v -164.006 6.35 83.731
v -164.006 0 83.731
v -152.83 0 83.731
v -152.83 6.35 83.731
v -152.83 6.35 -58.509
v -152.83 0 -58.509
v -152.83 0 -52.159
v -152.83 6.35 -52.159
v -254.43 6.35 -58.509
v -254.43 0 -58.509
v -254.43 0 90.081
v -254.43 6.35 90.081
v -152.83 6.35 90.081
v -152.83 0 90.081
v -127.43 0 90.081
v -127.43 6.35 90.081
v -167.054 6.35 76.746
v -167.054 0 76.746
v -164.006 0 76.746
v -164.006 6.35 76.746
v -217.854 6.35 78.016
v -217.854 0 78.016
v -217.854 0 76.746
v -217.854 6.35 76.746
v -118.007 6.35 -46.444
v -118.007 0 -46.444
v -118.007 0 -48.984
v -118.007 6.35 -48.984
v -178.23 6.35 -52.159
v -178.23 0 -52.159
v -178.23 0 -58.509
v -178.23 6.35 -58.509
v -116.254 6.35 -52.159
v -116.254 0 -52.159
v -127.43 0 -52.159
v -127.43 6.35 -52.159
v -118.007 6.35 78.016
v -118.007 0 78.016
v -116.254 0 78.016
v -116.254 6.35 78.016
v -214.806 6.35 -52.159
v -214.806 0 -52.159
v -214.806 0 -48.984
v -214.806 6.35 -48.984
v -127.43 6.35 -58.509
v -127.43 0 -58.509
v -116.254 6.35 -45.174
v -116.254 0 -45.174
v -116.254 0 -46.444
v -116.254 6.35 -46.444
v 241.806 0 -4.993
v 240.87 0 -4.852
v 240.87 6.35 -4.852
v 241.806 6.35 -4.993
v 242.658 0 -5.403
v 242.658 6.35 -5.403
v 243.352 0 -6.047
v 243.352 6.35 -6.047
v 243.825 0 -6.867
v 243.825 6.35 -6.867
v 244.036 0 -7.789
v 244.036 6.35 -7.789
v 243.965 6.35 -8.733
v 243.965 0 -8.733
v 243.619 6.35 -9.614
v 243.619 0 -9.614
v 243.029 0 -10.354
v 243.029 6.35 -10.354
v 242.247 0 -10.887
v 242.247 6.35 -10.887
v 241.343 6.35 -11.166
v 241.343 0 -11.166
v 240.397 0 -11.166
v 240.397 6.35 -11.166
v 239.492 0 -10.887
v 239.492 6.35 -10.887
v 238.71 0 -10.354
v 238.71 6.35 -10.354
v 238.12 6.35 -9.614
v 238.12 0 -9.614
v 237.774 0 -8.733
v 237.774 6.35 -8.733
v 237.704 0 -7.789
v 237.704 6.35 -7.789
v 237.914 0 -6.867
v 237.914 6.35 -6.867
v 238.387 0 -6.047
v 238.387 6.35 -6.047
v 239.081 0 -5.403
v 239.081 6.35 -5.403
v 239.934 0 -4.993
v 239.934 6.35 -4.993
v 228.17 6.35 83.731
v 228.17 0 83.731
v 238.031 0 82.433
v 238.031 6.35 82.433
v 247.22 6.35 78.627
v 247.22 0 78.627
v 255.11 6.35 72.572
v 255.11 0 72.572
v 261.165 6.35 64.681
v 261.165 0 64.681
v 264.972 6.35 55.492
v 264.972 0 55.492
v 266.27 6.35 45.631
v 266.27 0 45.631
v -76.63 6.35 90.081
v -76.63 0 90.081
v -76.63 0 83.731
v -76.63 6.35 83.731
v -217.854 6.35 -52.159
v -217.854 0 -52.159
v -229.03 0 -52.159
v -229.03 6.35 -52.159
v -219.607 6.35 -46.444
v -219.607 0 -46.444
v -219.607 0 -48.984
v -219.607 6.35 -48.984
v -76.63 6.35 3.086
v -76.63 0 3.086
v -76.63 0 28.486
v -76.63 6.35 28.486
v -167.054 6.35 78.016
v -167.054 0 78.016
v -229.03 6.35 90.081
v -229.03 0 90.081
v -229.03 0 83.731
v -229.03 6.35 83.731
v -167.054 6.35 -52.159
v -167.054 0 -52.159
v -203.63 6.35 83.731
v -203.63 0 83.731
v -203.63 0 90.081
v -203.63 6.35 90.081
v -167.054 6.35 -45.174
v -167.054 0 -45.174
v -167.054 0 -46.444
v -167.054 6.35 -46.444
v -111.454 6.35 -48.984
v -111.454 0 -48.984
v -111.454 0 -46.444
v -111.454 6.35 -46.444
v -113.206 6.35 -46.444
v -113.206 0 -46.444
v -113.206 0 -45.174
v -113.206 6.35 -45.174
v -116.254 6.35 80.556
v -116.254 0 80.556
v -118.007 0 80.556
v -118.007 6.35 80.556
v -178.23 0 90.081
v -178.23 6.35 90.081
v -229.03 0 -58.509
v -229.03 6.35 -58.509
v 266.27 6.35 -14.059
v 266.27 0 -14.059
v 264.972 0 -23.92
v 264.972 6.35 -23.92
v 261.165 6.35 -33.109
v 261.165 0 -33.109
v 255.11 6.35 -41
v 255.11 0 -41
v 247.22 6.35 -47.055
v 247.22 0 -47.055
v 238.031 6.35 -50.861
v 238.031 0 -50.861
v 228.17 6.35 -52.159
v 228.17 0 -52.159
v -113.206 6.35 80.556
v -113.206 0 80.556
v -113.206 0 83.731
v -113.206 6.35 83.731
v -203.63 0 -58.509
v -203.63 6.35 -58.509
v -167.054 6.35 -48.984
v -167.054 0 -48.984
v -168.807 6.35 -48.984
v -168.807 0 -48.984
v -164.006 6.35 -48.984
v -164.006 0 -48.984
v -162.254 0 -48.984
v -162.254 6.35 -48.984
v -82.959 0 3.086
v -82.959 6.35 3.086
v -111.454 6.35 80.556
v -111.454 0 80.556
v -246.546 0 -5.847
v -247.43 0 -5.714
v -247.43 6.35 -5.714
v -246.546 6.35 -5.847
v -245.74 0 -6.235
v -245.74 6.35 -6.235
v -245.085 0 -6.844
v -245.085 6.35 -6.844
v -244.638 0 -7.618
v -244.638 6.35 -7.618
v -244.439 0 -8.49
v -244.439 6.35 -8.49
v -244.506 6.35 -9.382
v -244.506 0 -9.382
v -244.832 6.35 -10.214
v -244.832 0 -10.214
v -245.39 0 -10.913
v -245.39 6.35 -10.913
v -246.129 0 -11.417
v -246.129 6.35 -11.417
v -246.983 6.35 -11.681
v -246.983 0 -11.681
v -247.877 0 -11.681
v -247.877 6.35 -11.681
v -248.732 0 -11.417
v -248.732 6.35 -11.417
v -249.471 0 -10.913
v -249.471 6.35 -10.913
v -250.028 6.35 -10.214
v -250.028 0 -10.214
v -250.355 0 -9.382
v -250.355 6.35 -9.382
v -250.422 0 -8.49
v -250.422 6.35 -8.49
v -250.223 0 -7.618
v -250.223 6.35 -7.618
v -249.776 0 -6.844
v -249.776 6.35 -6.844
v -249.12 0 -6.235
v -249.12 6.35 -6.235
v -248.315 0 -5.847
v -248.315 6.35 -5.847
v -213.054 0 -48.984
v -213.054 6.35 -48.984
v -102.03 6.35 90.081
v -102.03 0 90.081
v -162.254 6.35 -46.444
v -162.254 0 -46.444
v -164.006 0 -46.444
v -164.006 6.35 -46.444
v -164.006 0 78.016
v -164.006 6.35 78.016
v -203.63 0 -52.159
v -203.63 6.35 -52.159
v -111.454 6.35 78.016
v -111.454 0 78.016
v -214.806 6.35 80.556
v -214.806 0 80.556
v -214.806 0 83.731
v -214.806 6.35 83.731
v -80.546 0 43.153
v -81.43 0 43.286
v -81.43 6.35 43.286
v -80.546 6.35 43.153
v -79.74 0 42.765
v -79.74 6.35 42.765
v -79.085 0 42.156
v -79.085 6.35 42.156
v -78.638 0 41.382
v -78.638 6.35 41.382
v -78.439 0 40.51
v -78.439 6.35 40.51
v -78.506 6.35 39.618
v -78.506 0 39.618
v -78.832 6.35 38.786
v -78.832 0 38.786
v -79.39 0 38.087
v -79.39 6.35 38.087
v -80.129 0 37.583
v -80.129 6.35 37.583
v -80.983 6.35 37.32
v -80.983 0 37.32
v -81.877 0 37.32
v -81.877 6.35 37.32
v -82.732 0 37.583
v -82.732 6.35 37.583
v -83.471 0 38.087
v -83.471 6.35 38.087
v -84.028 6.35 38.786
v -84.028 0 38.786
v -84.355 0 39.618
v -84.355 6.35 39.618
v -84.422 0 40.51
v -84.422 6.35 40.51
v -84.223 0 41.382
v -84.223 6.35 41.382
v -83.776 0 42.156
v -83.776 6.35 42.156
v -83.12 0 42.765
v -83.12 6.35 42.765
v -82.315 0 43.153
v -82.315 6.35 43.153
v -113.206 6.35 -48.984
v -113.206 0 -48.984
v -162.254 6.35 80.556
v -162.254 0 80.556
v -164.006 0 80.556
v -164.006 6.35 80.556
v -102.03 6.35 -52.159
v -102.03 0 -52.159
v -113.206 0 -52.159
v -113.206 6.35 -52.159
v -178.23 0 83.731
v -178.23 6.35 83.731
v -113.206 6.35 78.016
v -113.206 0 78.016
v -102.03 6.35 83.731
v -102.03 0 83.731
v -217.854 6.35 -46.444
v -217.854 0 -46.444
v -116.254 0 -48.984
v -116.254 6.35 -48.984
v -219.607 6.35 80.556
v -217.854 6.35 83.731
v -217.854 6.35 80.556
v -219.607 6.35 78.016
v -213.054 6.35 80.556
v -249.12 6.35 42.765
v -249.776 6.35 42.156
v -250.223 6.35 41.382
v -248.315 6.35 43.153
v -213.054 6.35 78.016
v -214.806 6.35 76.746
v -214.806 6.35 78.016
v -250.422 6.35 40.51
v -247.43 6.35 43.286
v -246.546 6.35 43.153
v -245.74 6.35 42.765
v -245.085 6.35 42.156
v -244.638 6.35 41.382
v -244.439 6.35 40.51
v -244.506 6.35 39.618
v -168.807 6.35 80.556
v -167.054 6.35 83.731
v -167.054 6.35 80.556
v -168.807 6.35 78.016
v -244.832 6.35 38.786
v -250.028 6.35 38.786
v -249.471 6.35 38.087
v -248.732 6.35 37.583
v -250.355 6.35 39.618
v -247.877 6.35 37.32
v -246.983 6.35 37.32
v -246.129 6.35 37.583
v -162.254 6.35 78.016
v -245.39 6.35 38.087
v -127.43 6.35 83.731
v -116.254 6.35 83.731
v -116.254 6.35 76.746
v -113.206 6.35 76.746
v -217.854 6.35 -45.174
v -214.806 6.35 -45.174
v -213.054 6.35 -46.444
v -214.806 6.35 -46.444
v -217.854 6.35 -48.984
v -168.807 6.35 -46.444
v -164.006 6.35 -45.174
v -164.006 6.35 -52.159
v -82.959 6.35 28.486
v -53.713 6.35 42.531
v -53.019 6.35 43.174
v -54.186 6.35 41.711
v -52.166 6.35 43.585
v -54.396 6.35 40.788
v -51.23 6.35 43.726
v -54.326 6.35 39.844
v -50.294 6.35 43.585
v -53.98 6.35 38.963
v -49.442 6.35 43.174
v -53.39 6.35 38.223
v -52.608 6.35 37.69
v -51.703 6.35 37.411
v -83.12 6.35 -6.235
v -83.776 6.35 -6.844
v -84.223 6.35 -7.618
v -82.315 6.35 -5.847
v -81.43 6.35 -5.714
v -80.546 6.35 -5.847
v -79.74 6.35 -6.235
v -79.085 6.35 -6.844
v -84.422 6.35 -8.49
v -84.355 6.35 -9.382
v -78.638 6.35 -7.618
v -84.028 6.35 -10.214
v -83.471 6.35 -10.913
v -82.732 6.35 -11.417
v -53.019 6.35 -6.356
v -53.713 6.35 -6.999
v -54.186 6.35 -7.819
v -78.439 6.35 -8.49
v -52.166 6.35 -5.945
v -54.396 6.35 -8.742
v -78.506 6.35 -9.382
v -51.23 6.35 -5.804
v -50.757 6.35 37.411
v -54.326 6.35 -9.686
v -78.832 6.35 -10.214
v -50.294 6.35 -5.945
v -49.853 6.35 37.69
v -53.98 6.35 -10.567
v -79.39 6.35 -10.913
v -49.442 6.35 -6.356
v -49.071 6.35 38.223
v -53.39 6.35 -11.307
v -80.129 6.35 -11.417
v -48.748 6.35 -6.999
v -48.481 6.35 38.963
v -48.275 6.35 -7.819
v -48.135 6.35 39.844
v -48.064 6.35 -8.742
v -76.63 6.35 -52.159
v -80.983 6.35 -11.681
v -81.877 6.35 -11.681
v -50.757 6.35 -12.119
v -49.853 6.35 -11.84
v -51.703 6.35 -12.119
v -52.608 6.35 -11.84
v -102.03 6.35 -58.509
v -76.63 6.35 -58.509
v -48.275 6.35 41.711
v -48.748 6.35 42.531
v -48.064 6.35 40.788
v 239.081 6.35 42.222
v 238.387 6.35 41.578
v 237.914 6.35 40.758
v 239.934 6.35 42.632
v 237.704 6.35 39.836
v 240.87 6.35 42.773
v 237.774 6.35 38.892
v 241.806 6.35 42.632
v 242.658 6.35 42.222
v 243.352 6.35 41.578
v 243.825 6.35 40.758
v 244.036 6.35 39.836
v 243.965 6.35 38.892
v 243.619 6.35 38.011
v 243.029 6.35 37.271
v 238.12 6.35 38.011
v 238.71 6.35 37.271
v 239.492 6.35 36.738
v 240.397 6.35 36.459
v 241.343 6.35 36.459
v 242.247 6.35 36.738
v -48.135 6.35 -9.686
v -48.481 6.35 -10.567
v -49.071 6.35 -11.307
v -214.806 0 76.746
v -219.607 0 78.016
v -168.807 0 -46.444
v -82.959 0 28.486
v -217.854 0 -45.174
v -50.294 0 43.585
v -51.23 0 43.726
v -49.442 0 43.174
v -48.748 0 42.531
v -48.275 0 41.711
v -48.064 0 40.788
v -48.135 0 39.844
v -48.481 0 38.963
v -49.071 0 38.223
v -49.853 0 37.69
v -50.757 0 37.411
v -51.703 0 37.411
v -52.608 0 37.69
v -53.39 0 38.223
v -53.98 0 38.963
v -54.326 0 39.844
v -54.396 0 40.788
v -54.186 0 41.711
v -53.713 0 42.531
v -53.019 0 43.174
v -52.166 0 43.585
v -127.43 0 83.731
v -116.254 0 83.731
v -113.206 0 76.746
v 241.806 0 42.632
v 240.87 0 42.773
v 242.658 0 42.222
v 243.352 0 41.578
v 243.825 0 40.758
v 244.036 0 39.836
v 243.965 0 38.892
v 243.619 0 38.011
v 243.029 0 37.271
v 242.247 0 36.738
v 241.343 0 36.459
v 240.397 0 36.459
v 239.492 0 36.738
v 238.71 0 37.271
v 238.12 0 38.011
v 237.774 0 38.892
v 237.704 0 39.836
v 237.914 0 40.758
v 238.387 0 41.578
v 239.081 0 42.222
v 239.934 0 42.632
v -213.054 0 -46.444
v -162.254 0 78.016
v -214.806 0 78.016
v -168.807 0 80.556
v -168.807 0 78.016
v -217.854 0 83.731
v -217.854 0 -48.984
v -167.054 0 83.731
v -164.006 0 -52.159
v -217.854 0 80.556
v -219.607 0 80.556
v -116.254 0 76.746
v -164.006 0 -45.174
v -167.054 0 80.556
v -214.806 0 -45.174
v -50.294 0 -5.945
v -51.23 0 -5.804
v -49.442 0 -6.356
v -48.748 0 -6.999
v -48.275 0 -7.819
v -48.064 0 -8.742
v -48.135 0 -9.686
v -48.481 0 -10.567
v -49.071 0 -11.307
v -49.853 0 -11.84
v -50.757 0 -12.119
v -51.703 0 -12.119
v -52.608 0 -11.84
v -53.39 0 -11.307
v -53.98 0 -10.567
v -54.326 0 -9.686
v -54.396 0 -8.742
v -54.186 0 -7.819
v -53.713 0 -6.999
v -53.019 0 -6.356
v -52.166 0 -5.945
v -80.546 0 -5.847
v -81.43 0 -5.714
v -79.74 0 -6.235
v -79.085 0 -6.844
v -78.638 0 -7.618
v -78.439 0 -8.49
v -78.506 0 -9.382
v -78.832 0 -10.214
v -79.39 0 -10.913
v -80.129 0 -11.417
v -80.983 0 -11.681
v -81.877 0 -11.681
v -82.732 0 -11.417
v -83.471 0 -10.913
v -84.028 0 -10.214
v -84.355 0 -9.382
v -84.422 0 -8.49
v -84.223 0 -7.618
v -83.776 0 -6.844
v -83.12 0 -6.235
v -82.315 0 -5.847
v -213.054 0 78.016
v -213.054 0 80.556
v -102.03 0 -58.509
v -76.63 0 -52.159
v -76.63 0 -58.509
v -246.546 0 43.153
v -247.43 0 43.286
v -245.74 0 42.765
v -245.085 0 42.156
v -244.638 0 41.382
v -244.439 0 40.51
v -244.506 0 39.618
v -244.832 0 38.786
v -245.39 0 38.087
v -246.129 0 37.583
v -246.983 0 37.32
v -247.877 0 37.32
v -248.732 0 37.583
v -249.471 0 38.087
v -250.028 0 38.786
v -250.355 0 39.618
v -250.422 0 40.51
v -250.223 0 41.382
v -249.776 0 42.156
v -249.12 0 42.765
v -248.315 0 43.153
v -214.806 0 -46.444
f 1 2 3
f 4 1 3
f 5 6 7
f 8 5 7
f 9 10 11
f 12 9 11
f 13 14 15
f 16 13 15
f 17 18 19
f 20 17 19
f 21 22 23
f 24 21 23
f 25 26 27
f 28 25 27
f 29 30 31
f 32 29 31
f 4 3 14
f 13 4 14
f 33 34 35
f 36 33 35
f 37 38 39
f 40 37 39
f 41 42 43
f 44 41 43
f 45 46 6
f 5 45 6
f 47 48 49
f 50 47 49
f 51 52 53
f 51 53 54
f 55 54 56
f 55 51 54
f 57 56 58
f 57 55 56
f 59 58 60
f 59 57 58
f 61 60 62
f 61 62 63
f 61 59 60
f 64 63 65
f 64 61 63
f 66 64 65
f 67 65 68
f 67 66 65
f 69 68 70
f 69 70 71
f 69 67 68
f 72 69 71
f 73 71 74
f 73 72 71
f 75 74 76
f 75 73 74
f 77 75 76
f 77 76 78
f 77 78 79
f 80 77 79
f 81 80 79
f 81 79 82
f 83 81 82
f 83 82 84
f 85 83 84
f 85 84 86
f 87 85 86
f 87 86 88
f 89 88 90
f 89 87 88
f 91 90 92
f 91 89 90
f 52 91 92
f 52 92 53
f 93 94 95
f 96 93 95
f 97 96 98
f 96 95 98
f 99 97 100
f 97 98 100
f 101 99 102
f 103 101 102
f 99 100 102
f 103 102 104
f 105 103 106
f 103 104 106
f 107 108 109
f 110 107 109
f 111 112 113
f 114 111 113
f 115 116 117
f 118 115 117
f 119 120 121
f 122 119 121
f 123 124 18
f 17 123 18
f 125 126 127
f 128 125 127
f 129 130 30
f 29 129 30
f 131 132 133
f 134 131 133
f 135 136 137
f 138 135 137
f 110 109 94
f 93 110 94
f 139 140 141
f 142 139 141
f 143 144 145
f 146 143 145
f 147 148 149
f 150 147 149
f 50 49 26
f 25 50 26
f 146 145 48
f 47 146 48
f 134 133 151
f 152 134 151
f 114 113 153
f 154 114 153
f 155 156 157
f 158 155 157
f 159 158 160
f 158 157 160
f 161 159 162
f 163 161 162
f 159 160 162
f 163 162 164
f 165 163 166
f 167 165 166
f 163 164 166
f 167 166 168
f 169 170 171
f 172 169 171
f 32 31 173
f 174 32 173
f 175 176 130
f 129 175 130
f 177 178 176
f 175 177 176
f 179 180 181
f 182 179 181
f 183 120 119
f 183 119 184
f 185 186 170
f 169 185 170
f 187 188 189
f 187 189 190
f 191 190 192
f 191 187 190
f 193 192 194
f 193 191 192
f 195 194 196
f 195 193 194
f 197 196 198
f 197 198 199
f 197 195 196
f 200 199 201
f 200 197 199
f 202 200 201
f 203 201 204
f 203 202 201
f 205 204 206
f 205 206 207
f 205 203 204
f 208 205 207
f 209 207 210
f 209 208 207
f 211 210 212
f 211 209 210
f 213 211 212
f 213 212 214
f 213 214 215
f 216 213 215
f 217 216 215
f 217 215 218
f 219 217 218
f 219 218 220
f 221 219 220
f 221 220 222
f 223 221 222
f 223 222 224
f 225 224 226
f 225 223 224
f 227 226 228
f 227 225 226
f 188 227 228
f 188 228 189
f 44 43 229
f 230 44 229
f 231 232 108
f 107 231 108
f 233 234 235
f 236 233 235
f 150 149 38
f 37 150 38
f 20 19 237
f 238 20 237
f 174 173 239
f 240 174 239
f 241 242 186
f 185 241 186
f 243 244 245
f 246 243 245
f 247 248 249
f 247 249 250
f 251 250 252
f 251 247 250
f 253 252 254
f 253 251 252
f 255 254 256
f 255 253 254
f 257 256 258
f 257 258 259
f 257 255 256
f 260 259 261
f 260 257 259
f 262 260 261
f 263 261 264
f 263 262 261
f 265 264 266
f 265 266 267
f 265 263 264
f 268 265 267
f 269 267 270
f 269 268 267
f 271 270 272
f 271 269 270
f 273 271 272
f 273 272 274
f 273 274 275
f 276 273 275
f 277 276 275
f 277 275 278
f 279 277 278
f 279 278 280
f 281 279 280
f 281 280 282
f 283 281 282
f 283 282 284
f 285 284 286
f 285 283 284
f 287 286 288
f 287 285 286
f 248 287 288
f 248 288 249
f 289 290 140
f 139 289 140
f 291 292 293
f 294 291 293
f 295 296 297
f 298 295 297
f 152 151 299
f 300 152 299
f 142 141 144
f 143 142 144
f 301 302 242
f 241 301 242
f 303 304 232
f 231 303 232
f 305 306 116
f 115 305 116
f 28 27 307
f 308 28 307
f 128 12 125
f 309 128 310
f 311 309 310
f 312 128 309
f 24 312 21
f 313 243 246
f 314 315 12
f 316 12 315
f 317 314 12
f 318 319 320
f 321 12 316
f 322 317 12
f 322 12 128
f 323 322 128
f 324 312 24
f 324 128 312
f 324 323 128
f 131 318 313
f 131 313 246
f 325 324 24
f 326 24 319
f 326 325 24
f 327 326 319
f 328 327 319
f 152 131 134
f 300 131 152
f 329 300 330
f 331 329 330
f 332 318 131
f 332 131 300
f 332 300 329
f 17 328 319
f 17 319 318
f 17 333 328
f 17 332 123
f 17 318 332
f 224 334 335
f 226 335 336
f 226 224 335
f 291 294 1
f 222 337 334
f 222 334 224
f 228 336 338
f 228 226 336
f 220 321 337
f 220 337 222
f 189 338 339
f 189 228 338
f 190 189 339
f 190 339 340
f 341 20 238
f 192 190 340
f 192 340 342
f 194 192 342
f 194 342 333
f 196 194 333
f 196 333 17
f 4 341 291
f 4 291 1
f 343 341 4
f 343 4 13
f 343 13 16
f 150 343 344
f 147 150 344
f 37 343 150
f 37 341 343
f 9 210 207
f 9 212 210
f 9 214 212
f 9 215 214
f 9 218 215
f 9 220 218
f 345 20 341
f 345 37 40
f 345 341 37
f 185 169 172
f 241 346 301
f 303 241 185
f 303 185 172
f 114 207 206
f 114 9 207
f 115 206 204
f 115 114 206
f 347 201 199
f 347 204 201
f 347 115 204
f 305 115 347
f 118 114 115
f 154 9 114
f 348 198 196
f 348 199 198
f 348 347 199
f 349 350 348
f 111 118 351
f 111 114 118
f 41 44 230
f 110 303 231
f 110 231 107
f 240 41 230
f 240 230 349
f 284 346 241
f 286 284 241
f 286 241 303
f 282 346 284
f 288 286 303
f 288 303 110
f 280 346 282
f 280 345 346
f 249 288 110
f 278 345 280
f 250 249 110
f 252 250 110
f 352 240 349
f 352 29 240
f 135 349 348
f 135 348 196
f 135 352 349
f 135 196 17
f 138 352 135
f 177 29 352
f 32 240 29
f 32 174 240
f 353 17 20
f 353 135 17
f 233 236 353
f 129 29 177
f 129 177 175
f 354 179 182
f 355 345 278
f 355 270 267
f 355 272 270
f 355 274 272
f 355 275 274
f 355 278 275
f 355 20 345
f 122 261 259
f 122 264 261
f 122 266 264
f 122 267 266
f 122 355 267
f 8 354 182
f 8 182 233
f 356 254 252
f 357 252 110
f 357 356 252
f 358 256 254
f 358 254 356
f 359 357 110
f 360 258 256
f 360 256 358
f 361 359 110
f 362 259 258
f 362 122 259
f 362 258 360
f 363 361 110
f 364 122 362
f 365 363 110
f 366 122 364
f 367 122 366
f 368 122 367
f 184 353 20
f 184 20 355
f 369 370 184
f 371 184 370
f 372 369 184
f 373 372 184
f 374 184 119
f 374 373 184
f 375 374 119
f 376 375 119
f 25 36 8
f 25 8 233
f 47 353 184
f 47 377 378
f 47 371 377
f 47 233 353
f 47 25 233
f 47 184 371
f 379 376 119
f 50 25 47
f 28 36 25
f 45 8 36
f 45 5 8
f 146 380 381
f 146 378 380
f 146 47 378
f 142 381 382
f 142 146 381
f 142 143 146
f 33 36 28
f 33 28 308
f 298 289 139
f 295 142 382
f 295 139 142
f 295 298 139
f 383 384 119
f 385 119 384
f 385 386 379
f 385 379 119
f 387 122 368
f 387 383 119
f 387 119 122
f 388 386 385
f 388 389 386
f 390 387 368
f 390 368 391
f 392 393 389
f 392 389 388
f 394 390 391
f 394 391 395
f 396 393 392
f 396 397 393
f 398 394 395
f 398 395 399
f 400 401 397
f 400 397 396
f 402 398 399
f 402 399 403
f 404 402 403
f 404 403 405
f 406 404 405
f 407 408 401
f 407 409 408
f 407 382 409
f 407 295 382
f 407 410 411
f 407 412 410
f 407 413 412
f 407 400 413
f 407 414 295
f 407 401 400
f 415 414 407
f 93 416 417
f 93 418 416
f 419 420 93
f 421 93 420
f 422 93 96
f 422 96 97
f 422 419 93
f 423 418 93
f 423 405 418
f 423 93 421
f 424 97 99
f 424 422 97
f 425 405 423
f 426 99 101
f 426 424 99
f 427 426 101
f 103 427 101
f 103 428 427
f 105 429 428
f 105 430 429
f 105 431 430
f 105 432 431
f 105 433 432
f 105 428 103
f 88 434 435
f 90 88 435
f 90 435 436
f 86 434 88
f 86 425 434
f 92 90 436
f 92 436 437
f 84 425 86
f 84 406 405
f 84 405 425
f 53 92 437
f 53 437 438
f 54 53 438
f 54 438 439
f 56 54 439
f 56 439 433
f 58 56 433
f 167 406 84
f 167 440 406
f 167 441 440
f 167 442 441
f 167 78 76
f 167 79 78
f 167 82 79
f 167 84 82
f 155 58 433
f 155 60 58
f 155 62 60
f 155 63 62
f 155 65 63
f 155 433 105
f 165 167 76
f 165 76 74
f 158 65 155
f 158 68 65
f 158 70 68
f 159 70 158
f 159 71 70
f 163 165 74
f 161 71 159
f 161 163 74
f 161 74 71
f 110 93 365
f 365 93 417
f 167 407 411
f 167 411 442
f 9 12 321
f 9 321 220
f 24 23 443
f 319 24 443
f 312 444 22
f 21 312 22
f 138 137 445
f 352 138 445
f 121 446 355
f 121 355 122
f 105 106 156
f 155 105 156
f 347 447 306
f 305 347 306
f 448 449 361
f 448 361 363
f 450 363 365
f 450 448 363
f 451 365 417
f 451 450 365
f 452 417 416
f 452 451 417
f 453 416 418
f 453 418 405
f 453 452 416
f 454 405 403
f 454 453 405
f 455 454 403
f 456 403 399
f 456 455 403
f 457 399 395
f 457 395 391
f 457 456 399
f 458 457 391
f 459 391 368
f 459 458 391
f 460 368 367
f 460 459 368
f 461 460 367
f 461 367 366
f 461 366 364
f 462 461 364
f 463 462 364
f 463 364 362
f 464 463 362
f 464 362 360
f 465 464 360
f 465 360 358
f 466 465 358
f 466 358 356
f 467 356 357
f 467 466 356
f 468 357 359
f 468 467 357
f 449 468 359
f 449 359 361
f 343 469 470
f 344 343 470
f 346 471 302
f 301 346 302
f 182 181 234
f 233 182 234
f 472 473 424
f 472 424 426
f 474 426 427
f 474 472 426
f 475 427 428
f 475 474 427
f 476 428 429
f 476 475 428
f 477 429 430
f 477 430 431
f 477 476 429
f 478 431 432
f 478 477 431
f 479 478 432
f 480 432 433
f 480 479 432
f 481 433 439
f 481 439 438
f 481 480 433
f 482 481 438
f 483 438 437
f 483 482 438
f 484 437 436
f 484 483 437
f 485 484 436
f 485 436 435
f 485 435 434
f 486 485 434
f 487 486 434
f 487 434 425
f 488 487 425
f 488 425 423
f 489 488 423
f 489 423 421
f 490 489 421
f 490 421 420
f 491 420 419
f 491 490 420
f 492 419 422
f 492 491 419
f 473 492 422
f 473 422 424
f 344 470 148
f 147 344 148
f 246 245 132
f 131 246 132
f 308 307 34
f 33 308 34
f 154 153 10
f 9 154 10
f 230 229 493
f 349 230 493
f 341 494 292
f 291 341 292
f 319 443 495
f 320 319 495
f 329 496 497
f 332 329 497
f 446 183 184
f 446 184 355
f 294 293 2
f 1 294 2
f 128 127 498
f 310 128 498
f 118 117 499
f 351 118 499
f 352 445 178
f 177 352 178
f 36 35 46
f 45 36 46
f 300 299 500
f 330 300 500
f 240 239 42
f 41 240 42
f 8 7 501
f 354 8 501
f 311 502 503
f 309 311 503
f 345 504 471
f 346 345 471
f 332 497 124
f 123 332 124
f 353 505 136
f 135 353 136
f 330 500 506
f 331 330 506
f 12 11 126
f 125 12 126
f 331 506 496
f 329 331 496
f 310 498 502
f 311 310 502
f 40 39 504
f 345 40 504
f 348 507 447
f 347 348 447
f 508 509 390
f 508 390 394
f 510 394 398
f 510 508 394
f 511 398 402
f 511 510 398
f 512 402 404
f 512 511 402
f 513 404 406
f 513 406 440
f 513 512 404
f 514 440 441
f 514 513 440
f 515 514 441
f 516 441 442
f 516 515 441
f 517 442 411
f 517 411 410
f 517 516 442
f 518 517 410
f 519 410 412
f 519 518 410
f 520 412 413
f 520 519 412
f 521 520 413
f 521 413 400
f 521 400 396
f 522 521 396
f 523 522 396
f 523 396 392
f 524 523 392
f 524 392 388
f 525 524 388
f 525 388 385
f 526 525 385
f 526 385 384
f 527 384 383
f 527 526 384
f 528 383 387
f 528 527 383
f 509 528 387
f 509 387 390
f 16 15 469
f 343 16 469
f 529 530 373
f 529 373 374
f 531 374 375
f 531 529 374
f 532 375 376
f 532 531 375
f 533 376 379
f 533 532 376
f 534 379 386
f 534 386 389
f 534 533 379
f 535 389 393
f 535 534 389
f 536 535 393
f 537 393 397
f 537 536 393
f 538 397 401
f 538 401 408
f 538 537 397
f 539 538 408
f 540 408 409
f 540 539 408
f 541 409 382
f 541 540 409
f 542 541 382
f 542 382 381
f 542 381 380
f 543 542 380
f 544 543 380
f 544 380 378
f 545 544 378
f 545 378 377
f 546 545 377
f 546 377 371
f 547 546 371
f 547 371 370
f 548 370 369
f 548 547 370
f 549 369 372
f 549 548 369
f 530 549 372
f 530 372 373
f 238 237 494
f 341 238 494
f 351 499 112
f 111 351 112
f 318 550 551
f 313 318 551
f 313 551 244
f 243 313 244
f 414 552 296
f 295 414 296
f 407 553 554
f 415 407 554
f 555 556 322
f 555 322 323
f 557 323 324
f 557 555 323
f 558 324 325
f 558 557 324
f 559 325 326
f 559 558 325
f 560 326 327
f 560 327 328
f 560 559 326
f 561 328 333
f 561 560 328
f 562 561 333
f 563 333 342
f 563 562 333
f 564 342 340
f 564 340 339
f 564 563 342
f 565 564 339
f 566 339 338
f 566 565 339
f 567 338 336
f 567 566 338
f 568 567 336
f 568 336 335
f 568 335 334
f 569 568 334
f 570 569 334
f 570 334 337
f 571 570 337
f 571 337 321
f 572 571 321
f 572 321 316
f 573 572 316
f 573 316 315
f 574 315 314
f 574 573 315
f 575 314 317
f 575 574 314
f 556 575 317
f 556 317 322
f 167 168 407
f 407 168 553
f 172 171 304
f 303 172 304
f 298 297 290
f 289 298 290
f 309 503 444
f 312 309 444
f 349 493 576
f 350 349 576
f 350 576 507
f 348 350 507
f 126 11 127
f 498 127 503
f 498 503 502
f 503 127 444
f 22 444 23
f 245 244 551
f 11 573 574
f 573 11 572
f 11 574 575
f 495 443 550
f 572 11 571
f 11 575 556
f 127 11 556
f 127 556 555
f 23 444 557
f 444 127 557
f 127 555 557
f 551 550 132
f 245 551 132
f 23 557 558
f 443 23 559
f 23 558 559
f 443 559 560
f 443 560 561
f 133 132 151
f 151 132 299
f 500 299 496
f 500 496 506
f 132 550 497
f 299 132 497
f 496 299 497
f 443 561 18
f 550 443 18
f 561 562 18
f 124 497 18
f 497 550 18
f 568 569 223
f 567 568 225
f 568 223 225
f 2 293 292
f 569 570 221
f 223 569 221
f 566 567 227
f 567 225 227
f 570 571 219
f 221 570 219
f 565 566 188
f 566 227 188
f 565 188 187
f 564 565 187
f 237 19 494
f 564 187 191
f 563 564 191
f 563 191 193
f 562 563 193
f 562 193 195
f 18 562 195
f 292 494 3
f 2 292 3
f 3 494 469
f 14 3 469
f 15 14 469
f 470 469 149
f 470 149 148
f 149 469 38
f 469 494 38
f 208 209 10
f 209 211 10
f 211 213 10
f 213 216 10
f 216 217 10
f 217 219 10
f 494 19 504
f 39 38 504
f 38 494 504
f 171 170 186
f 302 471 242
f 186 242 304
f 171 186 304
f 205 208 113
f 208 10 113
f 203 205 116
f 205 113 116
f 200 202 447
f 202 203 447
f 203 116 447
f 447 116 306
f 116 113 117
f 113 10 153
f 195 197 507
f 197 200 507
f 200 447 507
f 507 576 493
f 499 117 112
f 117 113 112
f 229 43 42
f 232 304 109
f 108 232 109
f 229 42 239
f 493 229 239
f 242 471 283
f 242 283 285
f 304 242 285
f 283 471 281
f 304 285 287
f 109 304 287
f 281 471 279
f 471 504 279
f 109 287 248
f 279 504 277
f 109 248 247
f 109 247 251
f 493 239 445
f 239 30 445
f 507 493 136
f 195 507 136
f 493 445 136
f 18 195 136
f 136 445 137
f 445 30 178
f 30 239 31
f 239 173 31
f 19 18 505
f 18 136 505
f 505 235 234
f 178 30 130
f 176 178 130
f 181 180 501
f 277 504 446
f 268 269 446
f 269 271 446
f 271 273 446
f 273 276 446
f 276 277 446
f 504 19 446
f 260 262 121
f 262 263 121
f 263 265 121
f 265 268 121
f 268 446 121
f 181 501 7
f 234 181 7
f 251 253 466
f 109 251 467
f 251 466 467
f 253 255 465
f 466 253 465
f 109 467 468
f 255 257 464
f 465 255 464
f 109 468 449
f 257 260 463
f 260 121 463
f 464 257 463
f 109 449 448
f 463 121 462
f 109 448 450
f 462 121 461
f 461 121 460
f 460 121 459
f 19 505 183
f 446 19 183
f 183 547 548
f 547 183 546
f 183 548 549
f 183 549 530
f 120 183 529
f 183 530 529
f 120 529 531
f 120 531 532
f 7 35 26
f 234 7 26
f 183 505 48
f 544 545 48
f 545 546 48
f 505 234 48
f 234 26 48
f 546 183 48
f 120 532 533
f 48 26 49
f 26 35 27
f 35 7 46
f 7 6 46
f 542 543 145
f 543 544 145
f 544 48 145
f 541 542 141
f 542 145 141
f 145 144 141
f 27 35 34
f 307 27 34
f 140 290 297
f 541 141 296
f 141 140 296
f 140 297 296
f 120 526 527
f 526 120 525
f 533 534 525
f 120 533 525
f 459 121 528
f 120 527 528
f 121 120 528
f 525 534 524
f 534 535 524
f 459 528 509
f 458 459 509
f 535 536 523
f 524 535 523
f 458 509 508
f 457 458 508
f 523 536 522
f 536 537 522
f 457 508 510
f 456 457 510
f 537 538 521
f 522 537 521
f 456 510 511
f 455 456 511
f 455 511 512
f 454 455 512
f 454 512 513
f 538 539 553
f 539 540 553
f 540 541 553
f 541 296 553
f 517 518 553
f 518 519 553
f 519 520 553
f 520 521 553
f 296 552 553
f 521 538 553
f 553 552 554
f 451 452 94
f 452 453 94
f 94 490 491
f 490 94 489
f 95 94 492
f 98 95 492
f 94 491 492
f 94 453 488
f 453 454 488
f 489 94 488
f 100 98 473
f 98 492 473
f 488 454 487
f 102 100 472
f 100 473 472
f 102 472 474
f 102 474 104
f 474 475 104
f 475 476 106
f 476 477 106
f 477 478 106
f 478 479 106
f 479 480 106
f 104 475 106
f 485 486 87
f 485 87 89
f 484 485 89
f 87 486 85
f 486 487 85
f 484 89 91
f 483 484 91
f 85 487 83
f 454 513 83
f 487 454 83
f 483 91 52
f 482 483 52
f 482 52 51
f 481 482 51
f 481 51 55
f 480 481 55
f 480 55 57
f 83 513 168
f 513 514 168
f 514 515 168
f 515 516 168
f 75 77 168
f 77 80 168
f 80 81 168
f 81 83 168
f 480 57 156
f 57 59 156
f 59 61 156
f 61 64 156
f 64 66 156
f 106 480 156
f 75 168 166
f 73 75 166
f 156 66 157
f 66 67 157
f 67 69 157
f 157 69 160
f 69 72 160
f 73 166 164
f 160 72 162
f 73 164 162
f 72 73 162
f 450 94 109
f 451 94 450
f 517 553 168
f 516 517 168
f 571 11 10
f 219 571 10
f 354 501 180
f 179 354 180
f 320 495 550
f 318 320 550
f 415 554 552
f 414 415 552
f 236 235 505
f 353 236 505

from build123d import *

# Parameters (mm, degrees)
SKETCH1_R           = 3.175
SKETCH1_R_2         = 2.999994
BOSS_EXTRUDE1_DEPTH = 6.35


with BuildPart() as part:
    # Sketch1 → Boss-Extrude1 (new body)
    with BuildSketch(Plane(origin=(0, 0, 0), x_dir=(1, 0, 0), z_dir=(0, 1, 0))):
        with BuildLine():
            Line((-254.430272712, 52.159060564), (-254.430272712, -83.730939436))
            Line((-254.430272712, -83.730939436), (-254.430272712, -90.080939436))
            Line((-254.430272712, -90.080939436), (-229.030272712, -90.080939436))
            Line((-229.030272712, -90.080939436), (-229.030272712, -83.730939436))
            Line((-229.030272712, -83.730939436), (-217.85420239, -83.730939436))
            Line((-217.85420239, -83.730939436), (-217.85420239, -80.555939436))
            Line((-217.85420239, -80.555939436), (-219.60680239, -80.555939436))
            Line((-219.60680239, -80.555939436), (-219.60680239, -78.015939436))
            Line((-219.60680239, -78.015939436), (-217.85420239, -78.015939436))
            Line((-217.85420239, -78.015939436), (-217.85420239, -76.745939436))
            Line((-217.85420239, -76.745939436), (-214.806343034, -76.745939436))
            Line((-214.806343034, -76.745939436), (-214.806343034, -78.015939436))
            Line((-214.806343034, -78.015939436), (-213.053743034, -78.015939436))
            Line((-213.053743034, -78.015939436), (-213.053743034, -80.555939436))
            Line((-213.053743034, -80.555939436), (-214.806343034, -80.555939436))
            Line((-214.806343034, -80.555939436), (-214.806343034, -83.730939436))
            Line((-214.806343034, -83.730939436), (-203.630272712, -83.730939436))
            Line((-203.630272712, -83.730939436), (-203.630272712, -90.080939436))
            Line((-203.630272712, -90.080939436), (-178.230272712, -90.080939436))
            Line((-178.230272712, -90.080939436), (-178.230272712, -83.730939436))
            Line((-178.230272712, -83.730939436), (-167.05420239, -83.730939436))
            Line((-167.05420239, -83.730939436), (-167.05420239, -80.555939436))
            Line((-167.05420239, -80.555939436), (-168.80680239, -80.555939436))
            Line((-168.80680239, -80.555939436), (-168.80680239, -78.015939436))
            Line((-168.80680239, -78.015939436), (-167.05420239, -78.015939436))
            Line((-167.05420239, -78.015939436), (-167.05420239, -76.745939436))
            Line((-167.05420239, -76.745939436), (-164.006343034, -76.745939436))
            Line((-164.006343034, -76.745939436), (-164.006343034, -78.015939436))
            Line((-164.006343034, -78.015939436), (-162.253743034, -78.015939436))
            Line((-162.253743034, -78.015939436), (-162.253743034, -80.555939436))
            Line((-162.253743034, -80.555939436), (-164.006343034, -80.555939436))
            Line((-164.006343034, -80.555939436), (-164.006343034, -83.730939436))
            Line((-164.006343034, -83.730939436), (-152.830272712, -83.730939436))
            Line((-152.830272712, -83.730939436), (-152.830272712, -90.080939436))
            Line((-152.830272712, -90.080939436), (-127.430272712, -90.080939436))
            Line((-127.430272712, -90.080939436), (-127.430272712, -83.730939436))
            Line((-127.430272712, -83.730939436), (-116.25420239, -83.730939436))
            Line((-116.25420239, -83.730939436), (-116.25420239, -80.555939436))
            Line((-116.25420239, -80.555939436), (-118.00680239, -80.555939436))
            Line((-118.00680239, -80.555939436), (-118.00680239, -78.015939436))
            Line((-118.00680239, -78.015939436), (-116.25420239, -78.015939436))
            Line((-116.25420239, -78.015939436), (-116.25420239, -76.745939436))
            Line((-116.25420239, -76.745939436), (-113.206343034, -76.745939436))
            Line((-113.206343034, -76.745939436), (-113.206343034, -78.015939436))
            Line((-113.206343034, -78.015939436), (-111.453743034, -78.015939436))
            Line((-111.453743034, -78.015939436), (-111.453743034, -80.555939436))
            Line((-111.453743034, -80.555939436), (-113.206343034, -80.555939436))
            Line((-113.206343034, -80.555939436), (-113.206343034, -83.730939436))
            Line((-113.206343034, -83.730939436), (-102.030272712, -83.730939436))
            Line((-102.030272712, -83.730939436), (-102.030272712, -90.080939436))
            Line((-102.030272712, -90.080939436), (-76.630272712, -90.080939436))
            Line((-76.630272712, -90.080939436), (-76.630272712, -83.730939436))
            Line((-76.630272712, -83.730939436), (228.169727288, -83.730939436))
            ThreePointArc((228.169727288, -83.730939436), (255.110495652, -72.571707799), (266.269727288, -45.630939436))
            Line((266.269727288, -45.630939436), (266.269727288, 14.059060564))
            ThreePointArc((266.269727288, 14.059060564), (255.110495652, 40.999828928), (228.169727288, 52.159060564))
            Line((228.169727288, 52.159060564), (-76.630272712, 52.159060564))
            Line((-76.630272712, 52.159060564), (-76.630272712, 58.509060564))
            Line((-76.630272712, 58.509060564), (-102.030272712, 58.509060564))
            Line((-102.030272712, 58.509060564), (-102.030272712, 52.159060564))
            Line((-102.030272712, 52.159060564), (-113.206343034, 52.159060564))
            Line((-113.206343034, 52.159060564), (-113.206343034, 48.984060564))
            Line((-113.206343034, 48.984060564), (-111.453743034, 48.984060564))
            Line((-111.453743034, 48.984060564), (-111.453743034, 46.444060564))
            Line((-111.453743034, 46.444060564), (-113.206343034, 46.444060564))
            Line((-113.206343034, 46.444060564), (-113.206343034, 45.174060564))
            Line((-113.206343034, 45.174060564), (-116.25420239, 45.174060564))
            Line((-116.25420239, 45.174060564), (-116.25420239, 46.444060564))
            Line((-116.25420239, 46.444060564), (-118.00680239, 46.444060564))
            Line((-118.00680239, 46.444060564), (-118.00680239, 48.984060564))
            Line((-118.00680239, 48.984060564), (-116.25420239, 48.984060564))
            Line((-116.25420239, 48.984060564), (-116.25420239, 52.159060564))
            Line((-116.25420239, 52.159060564), (-127.430272712, 52.159060564))
            Line((-127.430272712, 52.159060564), (-127.430272712, 58.509060564))
            Line((-127.430272712, 58.509060564), (-152.830272712, 58.509060564))
            Line((-152.830272712, 58.509060564), (-152.830272712, 52.159060564))
            Line((-152.830272712, 52.159060564), (-164.006343034, 52.159060564))
            Line((-164.006343034, 52.159060564), (-164.006343034, 48.984060564))
            Line((-164.006343034, 48.984060564), (-162.253743034, 48.984060564))
            Line((-162.253743034, 48.984060564), (-162.253743034, 46.444060564))
            Line((-162.253743034, 46.444060564), (-164.006343034, 46.444060564))
            Line((-164.006343034, 46.444060564), (-164.006343034, 45.174060564))
            Line((-164.006343034, 45.174060564), (-167.05420239, 45.174060564))
            Line((-167.05420239, 45.174060564), (-167.05420239, 46.444060564))
            Line((-167.05420239, 46.444060564), (-168.80680239, 46.444060564))
            Line((-168.80680239, 46.444060564), (-168.80680239, 48.984060564))
            Line((-168.80680239, 48.984060564), (-167.05420239, 48.984060564))
            Line((-167.05420239, 48.984060564), (-167.05420239, 52.159060564))
            Line((-167.05420239, 52.159060564), (-178.230272712, 52.159060564))
            Line((-178.230272712, 52.159060564), (-178.230272712, 58.509060564))
            Line((-178.230272712, 58.509060564), (-203.630272712, 58.509060564))
            Line((-203.630272712, 58.509060564), (-203.630272712, 52.159060564))
            Line((-203.630272712, 52.159060564), (-214.806343034, 52.159060564))
            Line((-214.806343034, 52.159060564), (-214.806343034, 48.984060564))
            Line((-214.806343034, 48.984060564), (-213.053743034, 48.984060564))
            Line((-213.053743034, 48.984060564), (-213.053743034, 46.444060564))
            Line((-213.053743034, 46.444060564), (-214.806343034, 46.444060564))
            Line((-214.806343034, 46.444060564), (-214.806343034, 45.174060564))
            Line((-214.806343034, 45.174060564), (-217.85420239, 45.174060564))
            Line((-217.85420239, 45.174060564), (-217.85420239, 46.444060564))
            Line((-217.85420239, 46.444060564), (-219.60680239, 46.444060564))
            Line((-219.60680239, 46.444060564), (-219.60680239, 48.984060564))
            Line((-219.60680239, 48.984060564), (-217.85420239, 48.984060564))
            Line((-217.85420239, 48.984060564), (-217.85420239, 52.159060564))
            Line((-217.85420239, 52.159060564), (-229.030272712, 52.159060564))
            Line((-229.030272712, 52.159060564), (-229.030272712, 58.509060564))
            Line((-229.030272712, 58.509060564), (-254.430272712, 58.509060564))
            Line((-254.430272712, 58.509060564), (-254.430272712, 52.159060564))
        make_face()
        with Locations(Location((240.869727288, 8.026560564, 0), (0, 0, 270))):
            Circle(SKETCH1_R, mode=Mode.SUBTRACT)
        with Locations(Location((240.869727288, -39.598439436, 0), (0, 0, 270))):
            Circle(SKETCH1_R, mode=Mode.SUBTRACT)
        with Locations(Location((-51.230272712, -40.550939436, 0), (0, 0, 270))):
            Circle(SKETCH1_R, mode=Mode.SUBTRACT)
        with Locations(Location((-51.230272712, 8.979060564, 0), (0, 0, 270))):
            Circle(SKETCH1_R, mode=Mode.SUBTRACT)
        with Locations(Location((-247.430286712, 8.714138564, 0), (0, 0, 270))):
            Circle(SKETCH1_R_2, mode=Mode.SUBTRACT)
        with Locations(Location((-247.430286712, -40.286017436, 0), (0, 0, 270))):
            Circle(SKETCH1_R_2, mode=Mode.SUBTRACT)
        with Locations(Location((-81.430364712, 8.714138564, 0), (0, 0, 270))):
            Circle(SKETCH1_R_2, mode=Mode.SUBTRACT)
        with Locations(Location((-81.430364712, -40.286017436, 0), (0, 0, 270))):
            Circle(SKETCH1_R_2, mode=Mode.SUBTRACT)
        Polygon((-76.630272712, -15.785939436), (-76.630272712, -3.085939436), (-82.959141148, -3.085939436), (-82.959141148, -28.485939436), (-76.630272712, -28.485939436), align=None, mode=Mode.SUBTRACT)
    extrude(amount=BOSS_EXTRUDE1_DEPTH)


solid = part.part
